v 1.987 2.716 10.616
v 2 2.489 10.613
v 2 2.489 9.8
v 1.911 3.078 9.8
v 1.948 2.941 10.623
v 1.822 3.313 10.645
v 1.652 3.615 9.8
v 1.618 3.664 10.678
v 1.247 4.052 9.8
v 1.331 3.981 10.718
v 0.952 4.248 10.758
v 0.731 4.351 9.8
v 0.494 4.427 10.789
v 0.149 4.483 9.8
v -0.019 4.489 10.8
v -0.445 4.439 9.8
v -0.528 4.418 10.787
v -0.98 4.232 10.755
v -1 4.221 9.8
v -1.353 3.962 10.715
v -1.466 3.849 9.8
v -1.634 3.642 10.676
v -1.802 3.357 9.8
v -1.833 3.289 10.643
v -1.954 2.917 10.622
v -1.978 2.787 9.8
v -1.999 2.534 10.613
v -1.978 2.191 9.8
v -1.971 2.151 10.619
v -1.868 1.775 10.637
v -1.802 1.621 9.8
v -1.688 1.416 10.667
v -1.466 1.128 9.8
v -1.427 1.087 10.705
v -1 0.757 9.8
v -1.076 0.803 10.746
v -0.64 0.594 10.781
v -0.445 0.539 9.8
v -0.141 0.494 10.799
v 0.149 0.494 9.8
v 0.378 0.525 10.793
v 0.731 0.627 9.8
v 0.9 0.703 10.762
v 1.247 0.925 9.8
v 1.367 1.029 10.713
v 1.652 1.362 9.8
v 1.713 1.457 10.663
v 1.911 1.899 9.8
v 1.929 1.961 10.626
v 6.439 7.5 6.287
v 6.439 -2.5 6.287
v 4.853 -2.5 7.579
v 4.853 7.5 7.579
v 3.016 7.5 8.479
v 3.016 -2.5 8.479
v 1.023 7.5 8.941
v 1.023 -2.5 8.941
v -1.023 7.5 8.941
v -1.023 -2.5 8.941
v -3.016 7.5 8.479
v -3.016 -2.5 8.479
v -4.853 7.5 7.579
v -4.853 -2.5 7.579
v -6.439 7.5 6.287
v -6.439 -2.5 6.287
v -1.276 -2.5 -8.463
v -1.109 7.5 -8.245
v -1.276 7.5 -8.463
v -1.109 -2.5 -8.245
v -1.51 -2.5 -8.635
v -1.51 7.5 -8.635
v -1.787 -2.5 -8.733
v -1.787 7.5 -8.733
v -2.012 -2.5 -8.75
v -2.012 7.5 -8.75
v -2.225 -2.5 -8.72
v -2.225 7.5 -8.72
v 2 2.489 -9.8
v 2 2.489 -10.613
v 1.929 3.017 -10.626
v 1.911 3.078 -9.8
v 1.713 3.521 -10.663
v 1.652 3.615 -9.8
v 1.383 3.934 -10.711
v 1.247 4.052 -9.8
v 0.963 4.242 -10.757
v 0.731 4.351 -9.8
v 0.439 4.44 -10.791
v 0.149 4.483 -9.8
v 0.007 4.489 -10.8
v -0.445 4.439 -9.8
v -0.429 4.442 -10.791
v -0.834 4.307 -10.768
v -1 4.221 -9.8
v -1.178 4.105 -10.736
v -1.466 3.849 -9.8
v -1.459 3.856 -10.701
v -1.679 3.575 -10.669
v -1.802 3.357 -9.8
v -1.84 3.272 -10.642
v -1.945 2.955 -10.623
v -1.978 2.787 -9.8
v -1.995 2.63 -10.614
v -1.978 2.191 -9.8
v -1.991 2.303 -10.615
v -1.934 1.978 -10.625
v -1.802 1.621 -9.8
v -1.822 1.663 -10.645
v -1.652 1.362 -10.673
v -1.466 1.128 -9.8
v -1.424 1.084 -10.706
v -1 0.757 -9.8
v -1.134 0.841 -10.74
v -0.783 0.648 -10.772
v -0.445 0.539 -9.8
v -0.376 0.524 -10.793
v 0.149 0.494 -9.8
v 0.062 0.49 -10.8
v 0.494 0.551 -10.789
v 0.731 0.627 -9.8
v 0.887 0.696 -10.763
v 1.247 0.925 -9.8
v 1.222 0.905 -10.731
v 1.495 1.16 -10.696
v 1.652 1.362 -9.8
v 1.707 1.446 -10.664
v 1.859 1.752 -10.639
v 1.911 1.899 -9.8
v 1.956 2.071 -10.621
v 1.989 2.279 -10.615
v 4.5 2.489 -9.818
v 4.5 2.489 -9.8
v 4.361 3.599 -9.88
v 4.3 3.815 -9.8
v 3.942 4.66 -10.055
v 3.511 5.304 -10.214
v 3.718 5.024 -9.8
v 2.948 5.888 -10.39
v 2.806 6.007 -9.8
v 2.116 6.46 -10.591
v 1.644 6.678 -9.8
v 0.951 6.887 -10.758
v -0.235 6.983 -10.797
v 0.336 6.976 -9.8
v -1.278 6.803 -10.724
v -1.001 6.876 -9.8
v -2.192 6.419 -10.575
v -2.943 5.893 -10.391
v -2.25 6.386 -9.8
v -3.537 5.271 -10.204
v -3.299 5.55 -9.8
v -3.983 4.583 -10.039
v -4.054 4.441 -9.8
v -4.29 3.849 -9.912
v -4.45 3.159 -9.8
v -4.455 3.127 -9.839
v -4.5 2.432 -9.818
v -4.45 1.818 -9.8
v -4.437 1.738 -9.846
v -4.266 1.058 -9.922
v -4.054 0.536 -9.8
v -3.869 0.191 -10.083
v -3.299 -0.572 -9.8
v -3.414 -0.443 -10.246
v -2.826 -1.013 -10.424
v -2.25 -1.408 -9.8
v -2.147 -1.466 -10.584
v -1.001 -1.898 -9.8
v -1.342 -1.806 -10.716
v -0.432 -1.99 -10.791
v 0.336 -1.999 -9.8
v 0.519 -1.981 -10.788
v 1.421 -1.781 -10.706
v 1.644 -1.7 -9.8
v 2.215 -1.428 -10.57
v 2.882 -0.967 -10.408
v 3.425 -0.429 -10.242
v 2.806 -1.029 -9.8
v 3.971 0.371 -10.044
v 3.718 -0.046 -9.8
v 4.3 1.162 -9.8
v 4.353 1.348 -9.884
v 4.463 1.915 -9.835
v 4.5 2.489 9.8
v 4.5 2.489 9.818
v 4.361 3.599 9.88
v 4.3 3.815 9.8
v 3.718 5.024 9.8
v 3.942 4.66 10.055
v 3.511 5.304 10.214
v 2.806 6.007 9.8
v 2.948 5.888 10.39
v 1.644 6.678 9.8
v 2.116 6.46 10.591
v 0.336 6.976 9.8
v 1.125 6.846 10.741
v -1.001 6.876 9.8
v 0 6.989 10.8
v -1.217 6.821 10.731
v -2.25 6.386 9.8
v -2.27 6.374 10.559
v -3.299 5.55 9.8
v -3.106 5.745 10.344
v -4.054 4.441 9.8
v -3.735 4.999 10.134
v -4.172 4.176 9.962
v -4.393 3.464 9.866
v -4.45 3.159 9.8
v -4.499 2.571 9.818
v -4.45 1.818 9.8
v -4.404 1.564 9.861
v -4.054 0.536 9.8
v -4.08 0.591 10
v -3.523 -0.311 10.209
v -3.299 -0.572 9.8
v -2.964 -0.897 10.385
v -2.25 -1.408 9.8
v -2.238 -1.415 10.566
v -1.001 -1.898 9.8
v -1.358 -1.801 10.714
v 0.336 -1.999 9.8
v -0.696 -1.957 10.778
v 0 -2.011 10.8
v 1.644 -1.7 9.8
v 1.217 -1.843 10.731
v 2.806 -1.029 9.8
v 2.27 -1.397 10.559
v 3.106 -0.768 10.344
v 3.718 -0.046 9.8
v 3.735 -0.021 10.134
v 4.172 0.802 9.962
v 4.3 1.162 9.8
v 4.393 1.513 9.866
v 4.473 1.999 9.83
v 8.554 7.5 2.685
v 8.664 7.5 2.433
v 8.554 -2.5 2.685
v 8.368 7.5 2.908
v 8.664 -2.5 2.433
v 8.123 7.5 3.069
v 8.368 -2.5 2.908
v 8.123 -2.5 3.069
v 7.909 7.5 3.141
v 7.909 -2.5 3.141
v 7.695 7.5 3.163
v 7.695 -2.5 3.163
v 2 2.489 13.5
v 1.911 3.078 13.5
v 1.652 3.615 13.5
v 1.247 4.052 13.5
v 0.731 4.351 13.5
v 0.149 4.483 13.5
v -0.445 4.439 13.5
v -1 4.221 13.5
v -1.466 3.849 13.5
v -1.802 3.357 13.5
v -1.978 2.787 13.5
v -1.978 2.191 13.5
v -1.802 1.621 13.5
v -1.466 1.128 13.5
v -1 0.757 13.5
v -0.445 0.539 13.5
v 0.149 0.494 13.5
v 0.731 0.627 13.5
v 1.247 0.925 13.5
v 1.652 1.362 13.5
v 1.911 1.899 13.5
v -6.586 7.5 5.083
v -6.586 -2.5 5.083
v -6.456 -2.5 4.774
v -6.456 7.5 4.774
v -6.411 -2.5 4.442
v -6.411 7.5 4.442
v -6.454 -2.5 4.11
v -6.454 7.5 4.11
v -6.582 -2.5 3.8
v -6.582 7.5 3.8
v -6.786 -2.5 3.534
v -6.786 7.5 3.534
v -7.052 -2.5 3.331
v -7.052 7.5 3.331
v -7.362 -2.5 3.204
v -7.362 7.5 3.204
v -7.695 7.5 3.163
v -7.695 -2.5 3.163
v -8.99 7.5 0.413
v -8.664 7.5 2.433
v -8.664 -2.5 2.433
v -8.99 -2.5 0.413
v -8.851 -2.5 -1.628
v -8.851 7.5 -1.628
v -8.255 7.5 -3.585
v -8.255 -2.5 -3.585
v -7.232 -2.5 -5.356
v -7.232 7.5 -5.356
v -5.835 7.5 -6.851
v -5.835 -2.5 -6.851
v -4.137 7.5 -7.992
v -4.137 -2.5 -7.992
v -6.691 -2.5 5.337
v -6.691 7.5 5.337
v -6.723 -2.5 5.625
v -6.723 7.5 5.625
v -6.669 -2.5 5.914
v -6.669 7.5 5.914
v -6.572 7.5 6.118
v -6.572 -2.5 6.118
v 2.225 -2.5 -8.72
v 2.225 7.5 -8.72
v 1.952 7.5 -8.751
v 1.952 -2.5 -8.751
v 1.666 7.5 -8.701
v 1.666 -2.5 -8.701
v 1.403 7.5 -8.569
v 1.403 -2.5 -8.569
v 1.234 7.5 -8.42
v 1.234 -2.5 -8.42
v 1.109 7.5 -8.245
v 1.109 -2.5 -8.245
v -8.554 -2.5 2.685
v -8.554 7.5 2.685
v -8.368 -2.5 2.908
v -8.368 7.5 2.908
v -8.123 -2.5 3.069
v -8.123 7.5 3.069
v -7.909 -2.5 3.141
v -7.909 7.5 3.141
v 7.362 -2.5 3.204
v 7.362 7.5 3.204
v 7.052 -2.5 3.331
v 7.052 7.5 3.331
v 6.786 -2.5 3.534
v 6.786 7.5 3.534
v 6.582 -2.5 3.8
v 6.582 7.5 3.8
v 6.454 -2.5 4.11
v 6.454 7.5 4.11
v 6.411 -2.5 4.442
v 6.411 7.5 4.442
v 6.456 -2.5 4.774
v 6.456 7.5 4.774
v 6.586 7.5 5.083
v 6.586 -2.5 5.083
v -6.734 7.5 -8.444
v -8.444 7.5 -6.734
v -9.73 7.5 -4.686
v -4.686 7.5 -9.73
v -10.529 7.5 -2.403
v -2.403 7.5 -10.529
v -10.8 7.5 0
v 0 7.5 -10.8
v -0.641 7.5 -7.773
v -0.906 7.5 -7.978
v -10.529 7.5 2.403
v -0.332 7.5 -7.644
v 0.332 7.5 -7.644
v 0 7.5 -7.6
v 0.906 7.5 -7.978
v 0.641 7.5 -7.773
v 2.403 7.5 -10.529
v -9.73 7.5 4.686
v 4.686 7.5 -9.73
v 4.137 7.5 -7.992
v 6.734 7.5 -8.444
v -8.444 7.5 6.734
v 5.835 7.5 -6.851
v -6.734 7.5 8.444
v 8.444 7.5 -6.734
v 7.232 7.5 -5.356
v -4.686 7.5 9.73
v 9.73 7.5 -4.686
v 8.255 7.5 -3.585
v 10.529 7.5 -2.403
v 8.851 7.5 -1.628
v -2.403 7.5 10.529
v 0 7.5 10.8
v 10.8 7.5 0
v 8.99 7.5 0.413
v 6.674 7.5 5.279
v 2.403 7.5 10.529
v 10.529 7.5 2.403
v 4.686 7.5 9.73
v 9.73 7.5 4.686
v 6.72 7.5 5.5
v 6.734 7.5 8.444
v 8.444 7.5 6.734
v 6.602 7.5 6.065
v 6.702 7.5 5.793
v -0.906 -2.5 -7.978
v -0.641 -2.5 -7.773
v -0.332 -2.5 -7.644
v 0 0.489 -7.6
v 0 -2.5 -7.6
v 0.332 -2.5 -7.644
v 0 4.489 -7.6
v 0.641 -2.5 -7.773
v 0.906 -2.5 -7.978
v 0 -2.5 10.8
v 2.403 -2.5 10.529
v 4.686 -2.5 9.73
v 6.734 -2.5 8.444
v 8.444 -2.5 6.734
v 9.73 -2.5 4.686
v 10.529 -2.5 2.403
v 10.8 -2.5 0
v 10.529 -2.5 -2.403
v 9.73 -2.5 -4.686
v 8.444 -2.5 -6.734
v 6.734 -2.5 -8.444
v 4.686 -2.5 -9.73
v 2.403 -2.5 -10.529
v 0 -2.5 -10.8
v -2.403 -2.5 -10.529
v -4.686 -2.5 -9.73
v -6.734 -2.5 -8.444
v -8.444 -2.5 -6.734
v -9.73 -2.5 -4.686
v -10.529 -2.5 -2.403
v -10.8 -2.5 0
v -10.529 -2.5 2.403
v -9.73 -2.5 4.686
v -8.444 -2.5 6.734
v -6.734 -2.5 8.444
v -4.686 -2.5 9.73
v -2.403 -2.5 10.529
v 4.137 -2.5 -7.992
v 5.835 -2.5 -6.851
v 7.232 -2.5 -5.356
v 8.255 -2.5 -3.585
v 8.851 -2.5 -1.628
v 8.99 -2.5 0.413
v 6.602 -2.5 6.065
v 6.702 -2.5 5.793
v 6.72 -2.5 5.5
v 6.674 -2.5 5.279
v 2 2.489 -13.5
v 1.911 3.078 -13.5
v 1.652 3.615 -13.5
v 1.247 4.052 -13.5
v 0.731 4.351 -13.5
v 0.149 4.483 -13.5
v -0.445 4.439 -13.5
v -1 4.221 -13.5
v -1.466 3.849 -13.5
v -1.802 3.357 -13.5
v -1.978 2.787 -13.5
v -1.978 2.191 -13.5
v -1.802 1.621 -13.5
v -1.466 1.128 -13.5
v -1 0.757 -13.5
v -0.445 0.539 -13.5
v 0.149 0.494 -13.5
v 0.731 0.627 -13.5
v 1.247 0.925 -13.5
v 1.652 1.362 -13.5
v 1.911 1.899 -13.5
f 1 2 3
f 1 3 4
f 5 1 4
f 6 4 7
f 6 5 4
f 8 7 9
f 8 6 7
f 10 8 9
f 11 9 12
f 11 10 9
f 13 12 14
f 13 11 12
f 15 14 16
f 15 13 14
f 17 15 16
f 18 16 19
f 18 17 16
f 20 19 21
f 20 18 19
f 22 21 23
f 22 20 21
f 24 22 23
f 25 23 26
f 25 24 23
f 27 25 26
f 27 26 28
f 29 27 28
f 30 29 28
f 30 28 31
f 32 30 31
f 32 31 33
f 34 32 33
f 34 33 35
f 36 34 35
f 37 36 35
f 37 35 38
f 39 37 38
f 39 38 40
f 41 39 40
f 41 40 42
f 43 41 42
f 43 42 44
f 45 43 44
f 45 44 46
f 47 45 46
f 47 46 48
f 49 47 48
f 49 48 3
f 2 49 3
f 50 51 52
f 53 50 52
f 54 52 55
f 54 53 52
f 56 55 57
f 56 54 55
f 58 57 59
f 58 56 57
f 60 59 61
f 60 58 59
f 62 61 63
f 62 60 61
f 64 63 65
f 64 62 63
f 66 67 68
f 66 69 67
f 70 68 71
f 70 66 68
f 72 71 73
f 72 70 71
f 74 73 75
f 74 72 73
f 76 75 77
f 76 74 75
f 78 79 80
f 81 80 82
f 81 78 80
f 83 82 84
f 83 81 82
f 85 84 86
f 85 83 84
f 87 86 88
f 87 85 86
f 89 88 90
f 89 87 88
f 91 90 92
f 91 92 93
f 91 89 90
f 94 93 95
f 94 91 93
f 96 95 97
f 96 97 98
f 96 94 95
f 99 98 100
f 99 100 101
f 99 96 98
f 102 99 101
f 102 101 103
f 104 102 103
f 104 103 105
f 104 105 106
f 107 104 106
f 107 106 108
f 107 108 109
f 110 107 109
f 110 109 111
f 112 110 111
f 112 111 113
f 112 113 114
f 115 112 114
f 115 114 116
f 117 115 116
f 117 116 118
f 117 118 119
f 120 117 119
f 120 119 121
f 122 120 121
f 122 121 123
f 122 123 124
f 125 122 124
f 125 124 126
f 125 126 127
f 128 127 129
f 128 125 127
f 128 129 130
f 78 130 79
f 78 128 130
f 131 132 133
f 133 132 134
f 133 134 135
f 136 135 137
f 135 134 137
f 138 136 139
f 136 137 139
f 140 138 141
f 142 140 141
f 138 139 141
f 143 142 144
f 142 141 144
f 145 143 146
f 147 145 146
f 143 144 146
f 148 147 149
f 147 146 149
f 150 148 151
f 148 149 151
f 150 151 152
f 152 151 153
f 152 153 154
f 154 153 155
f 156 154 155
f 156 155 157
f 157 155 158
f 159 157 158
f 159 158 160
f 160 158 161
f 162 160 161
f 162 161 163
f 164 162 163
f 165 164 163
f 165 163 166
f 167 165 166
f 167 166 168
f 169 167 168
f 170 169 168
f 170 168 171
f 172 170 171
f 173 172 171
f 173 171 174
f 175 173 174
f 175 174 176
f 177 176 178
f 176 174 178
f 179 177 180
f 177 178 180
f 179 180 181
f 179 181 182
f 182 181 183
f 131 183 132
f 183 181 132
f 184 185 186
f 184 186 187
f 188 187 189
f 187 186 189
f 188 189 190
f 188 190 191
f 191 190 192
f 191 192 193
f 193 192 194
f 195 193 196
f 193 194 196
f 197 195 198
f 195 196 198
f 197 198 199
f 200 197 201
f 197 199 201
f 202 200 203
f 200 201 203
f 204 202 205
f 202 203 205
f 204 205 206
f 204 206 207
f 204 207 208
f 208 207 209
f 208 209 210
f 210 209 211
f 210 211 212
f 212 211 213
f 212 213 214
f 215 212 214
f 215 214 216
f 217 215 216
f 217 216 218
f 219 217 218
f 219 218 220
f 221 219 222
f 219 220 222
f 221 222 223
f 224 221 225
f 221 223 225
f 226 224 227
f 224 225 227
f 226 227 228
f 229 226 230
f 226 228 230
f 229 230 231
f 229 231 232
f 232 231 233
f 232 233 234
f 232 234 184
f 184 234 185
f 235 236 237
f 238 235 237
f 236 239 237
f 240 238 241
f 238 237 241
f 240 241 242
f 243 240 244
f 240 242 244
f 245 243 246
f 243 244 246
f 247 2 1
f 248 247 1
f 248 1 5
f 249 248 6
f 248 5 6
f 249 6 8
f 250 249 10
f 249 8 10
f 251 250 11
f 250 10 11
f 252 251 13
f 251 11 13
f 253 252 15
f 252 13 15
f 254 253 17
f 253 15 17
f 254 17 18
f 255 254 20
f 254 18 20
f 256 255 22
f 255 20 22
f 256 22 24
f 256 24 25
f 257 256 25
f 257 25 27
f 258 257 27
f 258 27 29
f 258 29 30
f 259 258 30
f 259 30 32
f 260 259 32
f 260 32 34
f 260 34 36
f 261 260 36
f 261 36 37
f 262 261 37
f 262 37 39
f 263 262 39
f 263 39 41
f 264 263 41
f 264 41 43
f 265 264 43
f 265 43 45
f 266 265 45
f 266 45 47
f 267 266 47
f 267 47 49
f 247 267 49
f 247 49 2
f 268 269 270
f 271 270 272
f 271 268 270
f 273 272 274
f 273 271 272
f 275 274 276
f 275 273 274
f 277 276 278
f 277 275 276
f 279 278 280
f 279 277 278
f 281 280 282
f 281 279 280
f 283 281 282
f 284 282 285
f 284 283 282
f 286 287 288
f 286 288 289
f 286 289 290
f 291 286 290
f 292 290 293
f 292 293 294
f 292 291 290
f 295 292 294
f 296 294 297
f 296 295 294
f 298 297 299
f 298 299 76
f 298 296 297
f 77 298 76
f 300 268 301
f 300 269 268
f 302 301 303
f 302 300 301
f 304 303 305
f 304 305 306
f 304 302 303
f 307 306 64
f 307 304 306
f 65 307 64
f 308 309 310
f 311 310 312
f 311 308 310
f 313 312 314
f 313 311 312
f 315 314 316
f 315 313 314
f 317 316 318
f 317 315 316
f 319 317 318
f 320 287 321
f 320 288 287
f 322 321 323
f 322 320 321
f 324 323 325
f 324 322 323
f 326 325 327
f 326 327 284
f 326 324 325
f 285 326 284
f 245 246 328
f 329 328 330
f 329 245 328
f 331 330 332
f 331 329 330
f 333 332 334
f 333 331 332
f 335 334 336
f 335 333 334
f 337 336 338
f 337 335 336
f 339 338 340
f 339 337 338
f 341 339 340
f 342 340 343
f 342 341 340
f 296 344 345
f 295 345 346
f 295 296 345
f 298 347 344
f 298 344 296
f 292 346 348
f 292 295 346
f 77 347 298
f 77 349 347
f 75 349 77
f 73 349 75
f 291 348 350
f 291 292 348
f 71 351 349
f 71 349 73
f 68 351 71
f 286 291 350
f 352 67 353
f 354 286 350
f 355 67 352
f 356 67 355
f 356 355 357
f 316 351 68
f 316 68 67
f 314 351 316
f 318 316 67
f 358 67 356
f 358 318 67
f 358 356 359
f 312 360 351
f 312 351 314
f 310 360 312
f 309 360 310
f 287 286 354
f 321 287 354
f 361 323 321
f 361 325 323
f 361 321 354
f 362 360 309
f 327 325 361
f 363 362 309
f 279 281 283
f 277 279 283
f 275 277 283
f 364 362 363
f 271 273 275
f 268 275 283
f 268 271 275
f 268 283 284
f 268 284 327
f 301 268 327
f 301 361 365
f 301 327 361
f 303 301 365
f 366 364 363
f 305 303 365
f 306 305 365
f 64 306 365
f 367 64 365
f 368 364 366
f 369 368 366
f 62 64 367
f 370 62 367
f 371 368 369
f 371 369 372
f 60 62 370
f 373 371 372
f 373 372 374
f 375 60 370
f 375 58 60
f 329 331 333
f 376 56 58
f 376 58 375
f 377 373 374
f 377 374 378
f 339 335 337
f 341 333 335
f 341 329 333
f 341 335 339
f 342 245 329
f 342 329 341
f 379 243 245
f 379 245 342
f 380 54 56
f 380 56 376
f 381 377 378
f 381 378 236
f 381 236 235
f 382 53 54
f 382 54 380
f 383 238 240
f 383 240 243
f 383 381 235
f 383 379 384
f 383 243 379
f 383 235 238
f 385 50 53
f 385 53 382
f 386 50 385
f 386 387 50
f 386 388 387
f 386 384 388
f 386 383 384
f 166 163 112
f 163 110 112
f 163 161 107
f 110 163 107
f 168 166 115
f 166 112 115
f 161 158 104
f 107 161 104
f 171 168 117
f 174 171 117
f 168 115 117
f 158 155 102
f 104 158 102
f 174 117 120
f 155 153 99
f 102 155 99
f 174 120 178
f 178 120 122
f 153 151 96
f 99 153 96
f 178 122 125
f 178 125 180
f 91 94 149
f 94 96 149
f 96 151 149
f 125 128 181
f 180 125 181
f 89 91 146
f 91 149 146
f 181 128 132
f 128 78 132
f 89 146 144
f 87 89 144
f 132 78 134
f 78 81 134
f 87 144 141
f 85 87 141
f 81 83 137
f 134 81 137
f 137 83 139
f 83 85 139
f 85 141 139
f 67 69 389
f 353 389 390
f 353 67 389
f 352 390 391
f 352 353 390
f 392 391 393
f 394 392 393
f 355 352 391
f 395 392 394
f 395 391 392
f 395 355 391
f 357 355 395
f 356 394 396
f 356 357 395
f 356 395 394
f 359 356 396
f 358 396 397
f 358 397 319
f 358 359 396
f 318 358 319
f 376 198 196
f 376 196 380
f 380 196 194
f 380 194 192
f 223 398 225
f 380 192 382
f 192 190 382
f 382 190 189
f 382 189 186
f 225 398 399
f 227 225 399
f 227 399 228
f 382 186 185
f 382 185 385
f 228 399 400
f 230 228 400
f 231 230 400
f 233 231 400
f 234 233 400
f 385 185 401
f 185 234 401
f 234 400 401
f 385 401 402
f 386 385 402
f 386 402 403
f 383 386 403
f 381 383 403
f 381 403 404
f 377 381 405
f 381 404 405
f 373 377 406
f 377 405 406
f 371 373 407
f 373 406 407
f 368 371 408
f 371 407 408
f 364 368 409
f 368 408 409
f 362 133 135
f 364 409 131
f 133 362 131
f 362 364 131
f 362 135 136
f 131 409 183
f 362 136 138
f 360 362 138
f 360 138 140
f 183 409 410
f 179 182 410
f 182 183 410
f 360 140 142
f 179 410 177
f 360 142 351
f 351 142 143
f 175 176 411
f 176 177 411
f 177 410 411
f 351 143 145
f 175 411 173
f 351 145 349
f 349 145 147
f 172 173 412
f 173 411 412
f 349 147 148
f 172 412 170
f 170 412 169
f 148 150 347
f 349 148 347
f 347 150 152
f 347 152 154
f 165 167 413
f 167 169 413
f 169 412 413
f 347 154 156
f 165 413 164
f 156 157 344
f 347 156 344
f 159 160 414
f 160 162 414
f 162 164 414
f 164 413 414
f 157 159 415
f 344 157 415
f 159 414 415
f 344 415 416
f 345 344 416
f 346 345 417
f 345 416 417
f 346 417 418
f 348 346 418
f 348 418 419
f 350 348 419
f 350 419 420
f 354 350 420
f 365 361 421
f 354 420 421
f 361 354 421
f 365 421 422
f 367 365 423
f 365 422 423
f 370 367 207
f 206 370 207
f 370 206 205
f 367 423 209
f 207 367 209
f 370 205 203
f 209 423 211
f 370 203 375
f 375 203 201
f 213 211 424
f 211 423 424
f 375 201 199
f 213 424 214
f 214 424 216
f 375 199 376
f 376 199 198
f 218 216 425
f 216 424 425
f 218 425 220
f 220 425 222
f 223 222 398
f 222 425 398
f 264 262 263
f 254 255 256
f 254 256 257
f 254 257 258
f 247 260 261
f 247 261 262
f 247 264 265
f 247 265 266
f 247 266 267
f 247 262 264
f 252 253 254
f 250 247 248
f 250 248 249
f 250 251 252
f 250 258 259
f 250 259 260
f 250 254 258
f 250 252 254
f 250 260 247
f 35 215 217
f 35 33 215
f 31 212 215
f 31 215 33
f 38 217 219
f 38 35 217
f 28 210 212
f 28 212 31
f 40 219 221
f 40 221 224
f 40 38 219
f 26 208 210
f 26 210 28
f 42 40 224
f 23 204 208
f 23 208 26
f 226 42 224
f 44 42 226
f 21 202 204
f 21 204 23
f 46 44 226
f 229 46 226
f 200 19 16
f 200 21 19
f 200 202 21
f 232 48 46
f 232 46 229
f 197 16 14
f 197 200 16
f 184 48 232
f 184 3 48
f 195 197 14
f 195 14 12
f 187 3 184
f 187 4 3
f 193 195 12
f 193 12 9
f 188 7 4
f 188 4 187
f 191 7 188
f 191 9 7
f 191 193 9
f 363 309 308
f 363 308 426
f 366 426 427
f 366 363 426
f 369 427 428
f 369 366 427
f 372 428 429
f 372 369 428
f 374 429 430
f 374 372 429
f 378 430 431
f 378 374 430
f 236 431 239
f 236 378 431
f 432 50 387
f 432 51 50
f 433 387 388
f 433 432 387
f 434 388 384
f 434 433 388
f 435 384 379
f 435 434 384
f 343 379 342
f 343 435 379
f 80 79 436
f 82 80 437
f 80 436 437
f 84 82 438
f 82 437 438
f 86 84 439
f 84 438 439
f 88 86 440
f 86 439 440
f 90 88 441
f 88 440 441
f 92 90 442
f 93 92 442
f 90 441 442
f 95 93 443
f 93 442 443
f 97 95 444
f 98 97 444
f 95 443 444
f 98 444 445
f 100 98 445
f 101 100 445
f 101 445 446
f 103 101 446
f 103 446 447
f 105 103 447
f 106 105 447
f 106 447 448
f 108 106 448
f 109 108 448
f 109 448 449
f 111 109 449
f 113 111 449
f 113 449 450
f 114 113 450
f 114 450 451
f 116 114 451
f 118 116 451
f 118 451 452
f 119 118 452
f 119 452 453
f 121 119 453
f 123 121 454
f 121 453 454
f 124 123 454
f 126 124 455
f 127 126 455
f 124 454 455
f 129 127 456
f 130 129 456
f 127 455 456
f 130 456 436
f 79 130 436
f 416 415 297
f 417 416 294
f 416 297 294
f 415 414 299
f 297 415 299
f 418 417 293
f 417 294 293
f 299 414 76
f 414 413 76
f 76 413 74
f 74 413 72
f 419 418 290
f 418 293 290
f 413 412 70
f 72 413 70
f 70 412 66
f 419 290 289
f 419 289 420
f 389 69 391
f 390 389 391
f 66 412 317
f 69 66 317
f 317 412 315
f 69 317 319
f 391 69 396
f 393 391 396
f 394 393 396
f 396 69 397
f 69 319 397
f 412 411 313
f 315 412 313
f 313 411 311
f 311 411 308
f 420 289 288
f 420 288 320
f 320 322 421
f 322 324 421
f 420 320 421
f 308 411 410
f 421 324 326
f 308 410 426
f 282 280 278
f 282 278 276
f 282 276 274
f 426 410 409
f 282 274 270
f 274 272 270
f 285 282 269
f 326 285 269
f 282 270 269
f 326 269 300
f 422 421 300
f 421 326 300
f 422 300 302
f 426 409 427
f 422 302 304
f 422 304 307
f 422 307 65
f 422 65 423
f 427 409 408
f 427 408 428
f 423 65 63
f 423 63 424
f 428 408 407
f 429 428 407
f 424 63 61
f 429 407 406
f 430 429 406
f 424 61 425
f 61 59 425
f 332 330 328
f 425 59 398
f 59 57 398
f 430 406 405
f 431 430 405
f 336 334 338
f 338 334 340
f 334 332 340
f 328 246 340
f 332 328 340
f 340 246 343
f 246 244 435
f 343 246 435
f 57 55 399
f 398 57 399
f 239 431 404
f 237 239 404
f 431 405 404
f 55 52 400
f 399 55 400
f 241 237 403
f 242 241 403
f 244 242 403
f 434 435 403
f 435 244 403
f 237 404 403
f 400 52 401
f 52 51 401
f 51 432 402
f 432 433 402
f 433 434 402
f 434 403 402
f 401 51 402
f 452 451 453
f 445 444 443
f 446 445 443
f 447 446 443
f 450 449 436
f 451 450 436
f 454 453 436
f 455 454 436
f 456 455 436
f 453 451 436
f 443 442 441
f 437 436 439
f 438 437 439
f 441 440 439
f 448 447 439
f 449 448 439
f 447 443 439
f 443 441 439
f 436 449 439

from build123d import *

# Parameters (mm, degrees)
BOSS_EXTRUDE1_DEPTH      = 7.5
BOSS_EXTRUDE1_DEPTH_BACK = 2.5
SKETCH1_R                = 10.8
SKETCH1_R_2              = 7.6
BOSS_EXTRUDE2_DEPTH      = 13.5
BOSS_EXTRUDE2_DEPTH_BACK = 13.5
SKETCH2_R                = 2
SKETCH3_R                = 7.25
CUT_EXTRUDE1_DEPTH       = 14
SKETCH4_R                = 7
CUT_EXTRUDE2_DEPTH       = 10
FILLET2_R                = 1
CUT_EXTRUDE3_START       = -9.8
SKETCH5_R                = 4.5
SKETCH5_R_2              = 2
CUT_EXTRUDE3_DEPTH       = 9.5
CUT_EXTRUDE4_START       = 19.3
SKETCH6_R                = 4.5
SKETCH6_R_2              = 2
CUT_EXTRUDE4_DEPTH       = 9.5


with BuildPart() as part:
    # Sketch1 → Boss-Extrude1 (new, two sides: drawn at the far end of the back side and taken through both)
    with BuildSketch(Plane(origin=(0, 0, 0), x_dir=(1, 0, 0), z_dir=(0, 1, 0)).offset(-BOSS_EXTRUDE1_DEPTH_BACK)):
        with Locations(Location((0, 0, 0), (0, 0, 270))):
            Circle(SKETCH1_R)
        with Locations(Location((0, 0, 0), (0, 0, 270))):
            Circle(SKETCH1_R_2, mode=Mode.SUBTRACT)
    extrude(amount=BOSS_EXTRUDE1_DEPTH + BOSS_EXTRUDE1_DEPTH_BACK)

    # Sketch2 → Boss-Extrude2 (add, two sides: drawn at the far end of the back side and taken through both)
    with BuildSketch(Plane.XY.offset(-BOSS_EXTRUDE2_DEPTH_BACK)):
        with Locations((0, 2.488781623)):
            Circle(SKETCH2_R)
    extrude(amount=BOSS_EXTRUDE2_DEPTH + BOSS_EXTRUDE2_DEPTH_BACK)

    # Sketch3 → Cut-Extrude1 (cut)
    with BuildSketch(Plane(origin=(0, 7.5, 0), x_dir=(1, 0, 0), z_dir=(0, 1, 0))):
        Circle(SKETCH3_R)
    extrude(amount=-CUT_EXTRUDE1_DEPTH, mode=Mode.SUBTRACT)

    # Sketch4 → Cut-Extrude2 (cut)
    with BuildSketch(Plane(origin=(0, 7.5, 0), x_dir=(1, 0, 0), z_dir=(0, 1, 0))):
        with BuildLine():
            ThreePointArc((-1.274588785, 8.908659182), (0, 7.6), (1.274588785, 8.908659182))
            ThreePointArc((1.274588785, 8.908659182), (7.793689033, 4.499688461), (8.352419558, -3.350503324))
            ThreePointArc((8.352419558, -3.350503324), (6.581793069, -3.8), (7.077830773, -5.558155858))
            ThreePointArc((7.077830773, -5.558155858), (0, -8.999376922), (-7.077830773, -5.558155858))
            ThreePointArc((-7.077830773, -5.558155858), (-6.581793069, -3.8), (-8.352419558, -3.350503324))
            ThreePointArc((-8.352419558, -3.350503324), (-7.793689033, 4.499688461), (-1.274588785, 8.908659182))
        make_face()
        Circle(SKETCH4_R, mode=Mode.SUBTRACT)
    extrude(amount=-CUT_EXTRUDE2_DEPTH, mode=Mode.SUBTRACT)

    # Fillet2
    fillet2_edges = [part.edges().sort_by_distance(p)[0] for p in [
        (-8.352419558, 2.5, 3.350503324),
        (-1.274588785, 2.5, -8.908659182),
        (1.274588785, 2.5, -8.908659182),
        (8.352419558, 2.5, 3.350503324),
        (7.077830773, 2.5, 5.558155858),
        (-7.077830773, 2.5, 5.558155858),
    ]]
    fillet(fillet2_edges, radius=FILLET2_R)

    # Sketch5 → Cut-Extrude3 (cut)
    with BuildSketch(Plane.XY.offset(CUT_EXTRUDE3_START)):
        with Locations((0, 2.488781623)):
            Circle(SKETCH5_R)
        with Locations((0, 2.488781623)):
            Circle(SKETCH5_R_2, mode=Mode.SUBTRACT)
    extrude(amount=-CUT_EXTRUDE3_DEPTH, mode=Mode.SUBTRACT)

    # Sketch6 → Cut-Extrude4 (cut)
    with BuildSketch(Plane.XY.offset(CUT_EXTRUDE4_START)):
        with Locations((0, 2.488781623)):
            Circle(SKETCH6_R)
        with Locations((0, 2.488781623)):
            Circle(SKETCH6_R_2, mode=Mode.SUBTRACT)
    extrude(amount=-CUT_EXTRUDE4_DEPTH, mode=Mode.SUBTRACT)


solid = part.part
